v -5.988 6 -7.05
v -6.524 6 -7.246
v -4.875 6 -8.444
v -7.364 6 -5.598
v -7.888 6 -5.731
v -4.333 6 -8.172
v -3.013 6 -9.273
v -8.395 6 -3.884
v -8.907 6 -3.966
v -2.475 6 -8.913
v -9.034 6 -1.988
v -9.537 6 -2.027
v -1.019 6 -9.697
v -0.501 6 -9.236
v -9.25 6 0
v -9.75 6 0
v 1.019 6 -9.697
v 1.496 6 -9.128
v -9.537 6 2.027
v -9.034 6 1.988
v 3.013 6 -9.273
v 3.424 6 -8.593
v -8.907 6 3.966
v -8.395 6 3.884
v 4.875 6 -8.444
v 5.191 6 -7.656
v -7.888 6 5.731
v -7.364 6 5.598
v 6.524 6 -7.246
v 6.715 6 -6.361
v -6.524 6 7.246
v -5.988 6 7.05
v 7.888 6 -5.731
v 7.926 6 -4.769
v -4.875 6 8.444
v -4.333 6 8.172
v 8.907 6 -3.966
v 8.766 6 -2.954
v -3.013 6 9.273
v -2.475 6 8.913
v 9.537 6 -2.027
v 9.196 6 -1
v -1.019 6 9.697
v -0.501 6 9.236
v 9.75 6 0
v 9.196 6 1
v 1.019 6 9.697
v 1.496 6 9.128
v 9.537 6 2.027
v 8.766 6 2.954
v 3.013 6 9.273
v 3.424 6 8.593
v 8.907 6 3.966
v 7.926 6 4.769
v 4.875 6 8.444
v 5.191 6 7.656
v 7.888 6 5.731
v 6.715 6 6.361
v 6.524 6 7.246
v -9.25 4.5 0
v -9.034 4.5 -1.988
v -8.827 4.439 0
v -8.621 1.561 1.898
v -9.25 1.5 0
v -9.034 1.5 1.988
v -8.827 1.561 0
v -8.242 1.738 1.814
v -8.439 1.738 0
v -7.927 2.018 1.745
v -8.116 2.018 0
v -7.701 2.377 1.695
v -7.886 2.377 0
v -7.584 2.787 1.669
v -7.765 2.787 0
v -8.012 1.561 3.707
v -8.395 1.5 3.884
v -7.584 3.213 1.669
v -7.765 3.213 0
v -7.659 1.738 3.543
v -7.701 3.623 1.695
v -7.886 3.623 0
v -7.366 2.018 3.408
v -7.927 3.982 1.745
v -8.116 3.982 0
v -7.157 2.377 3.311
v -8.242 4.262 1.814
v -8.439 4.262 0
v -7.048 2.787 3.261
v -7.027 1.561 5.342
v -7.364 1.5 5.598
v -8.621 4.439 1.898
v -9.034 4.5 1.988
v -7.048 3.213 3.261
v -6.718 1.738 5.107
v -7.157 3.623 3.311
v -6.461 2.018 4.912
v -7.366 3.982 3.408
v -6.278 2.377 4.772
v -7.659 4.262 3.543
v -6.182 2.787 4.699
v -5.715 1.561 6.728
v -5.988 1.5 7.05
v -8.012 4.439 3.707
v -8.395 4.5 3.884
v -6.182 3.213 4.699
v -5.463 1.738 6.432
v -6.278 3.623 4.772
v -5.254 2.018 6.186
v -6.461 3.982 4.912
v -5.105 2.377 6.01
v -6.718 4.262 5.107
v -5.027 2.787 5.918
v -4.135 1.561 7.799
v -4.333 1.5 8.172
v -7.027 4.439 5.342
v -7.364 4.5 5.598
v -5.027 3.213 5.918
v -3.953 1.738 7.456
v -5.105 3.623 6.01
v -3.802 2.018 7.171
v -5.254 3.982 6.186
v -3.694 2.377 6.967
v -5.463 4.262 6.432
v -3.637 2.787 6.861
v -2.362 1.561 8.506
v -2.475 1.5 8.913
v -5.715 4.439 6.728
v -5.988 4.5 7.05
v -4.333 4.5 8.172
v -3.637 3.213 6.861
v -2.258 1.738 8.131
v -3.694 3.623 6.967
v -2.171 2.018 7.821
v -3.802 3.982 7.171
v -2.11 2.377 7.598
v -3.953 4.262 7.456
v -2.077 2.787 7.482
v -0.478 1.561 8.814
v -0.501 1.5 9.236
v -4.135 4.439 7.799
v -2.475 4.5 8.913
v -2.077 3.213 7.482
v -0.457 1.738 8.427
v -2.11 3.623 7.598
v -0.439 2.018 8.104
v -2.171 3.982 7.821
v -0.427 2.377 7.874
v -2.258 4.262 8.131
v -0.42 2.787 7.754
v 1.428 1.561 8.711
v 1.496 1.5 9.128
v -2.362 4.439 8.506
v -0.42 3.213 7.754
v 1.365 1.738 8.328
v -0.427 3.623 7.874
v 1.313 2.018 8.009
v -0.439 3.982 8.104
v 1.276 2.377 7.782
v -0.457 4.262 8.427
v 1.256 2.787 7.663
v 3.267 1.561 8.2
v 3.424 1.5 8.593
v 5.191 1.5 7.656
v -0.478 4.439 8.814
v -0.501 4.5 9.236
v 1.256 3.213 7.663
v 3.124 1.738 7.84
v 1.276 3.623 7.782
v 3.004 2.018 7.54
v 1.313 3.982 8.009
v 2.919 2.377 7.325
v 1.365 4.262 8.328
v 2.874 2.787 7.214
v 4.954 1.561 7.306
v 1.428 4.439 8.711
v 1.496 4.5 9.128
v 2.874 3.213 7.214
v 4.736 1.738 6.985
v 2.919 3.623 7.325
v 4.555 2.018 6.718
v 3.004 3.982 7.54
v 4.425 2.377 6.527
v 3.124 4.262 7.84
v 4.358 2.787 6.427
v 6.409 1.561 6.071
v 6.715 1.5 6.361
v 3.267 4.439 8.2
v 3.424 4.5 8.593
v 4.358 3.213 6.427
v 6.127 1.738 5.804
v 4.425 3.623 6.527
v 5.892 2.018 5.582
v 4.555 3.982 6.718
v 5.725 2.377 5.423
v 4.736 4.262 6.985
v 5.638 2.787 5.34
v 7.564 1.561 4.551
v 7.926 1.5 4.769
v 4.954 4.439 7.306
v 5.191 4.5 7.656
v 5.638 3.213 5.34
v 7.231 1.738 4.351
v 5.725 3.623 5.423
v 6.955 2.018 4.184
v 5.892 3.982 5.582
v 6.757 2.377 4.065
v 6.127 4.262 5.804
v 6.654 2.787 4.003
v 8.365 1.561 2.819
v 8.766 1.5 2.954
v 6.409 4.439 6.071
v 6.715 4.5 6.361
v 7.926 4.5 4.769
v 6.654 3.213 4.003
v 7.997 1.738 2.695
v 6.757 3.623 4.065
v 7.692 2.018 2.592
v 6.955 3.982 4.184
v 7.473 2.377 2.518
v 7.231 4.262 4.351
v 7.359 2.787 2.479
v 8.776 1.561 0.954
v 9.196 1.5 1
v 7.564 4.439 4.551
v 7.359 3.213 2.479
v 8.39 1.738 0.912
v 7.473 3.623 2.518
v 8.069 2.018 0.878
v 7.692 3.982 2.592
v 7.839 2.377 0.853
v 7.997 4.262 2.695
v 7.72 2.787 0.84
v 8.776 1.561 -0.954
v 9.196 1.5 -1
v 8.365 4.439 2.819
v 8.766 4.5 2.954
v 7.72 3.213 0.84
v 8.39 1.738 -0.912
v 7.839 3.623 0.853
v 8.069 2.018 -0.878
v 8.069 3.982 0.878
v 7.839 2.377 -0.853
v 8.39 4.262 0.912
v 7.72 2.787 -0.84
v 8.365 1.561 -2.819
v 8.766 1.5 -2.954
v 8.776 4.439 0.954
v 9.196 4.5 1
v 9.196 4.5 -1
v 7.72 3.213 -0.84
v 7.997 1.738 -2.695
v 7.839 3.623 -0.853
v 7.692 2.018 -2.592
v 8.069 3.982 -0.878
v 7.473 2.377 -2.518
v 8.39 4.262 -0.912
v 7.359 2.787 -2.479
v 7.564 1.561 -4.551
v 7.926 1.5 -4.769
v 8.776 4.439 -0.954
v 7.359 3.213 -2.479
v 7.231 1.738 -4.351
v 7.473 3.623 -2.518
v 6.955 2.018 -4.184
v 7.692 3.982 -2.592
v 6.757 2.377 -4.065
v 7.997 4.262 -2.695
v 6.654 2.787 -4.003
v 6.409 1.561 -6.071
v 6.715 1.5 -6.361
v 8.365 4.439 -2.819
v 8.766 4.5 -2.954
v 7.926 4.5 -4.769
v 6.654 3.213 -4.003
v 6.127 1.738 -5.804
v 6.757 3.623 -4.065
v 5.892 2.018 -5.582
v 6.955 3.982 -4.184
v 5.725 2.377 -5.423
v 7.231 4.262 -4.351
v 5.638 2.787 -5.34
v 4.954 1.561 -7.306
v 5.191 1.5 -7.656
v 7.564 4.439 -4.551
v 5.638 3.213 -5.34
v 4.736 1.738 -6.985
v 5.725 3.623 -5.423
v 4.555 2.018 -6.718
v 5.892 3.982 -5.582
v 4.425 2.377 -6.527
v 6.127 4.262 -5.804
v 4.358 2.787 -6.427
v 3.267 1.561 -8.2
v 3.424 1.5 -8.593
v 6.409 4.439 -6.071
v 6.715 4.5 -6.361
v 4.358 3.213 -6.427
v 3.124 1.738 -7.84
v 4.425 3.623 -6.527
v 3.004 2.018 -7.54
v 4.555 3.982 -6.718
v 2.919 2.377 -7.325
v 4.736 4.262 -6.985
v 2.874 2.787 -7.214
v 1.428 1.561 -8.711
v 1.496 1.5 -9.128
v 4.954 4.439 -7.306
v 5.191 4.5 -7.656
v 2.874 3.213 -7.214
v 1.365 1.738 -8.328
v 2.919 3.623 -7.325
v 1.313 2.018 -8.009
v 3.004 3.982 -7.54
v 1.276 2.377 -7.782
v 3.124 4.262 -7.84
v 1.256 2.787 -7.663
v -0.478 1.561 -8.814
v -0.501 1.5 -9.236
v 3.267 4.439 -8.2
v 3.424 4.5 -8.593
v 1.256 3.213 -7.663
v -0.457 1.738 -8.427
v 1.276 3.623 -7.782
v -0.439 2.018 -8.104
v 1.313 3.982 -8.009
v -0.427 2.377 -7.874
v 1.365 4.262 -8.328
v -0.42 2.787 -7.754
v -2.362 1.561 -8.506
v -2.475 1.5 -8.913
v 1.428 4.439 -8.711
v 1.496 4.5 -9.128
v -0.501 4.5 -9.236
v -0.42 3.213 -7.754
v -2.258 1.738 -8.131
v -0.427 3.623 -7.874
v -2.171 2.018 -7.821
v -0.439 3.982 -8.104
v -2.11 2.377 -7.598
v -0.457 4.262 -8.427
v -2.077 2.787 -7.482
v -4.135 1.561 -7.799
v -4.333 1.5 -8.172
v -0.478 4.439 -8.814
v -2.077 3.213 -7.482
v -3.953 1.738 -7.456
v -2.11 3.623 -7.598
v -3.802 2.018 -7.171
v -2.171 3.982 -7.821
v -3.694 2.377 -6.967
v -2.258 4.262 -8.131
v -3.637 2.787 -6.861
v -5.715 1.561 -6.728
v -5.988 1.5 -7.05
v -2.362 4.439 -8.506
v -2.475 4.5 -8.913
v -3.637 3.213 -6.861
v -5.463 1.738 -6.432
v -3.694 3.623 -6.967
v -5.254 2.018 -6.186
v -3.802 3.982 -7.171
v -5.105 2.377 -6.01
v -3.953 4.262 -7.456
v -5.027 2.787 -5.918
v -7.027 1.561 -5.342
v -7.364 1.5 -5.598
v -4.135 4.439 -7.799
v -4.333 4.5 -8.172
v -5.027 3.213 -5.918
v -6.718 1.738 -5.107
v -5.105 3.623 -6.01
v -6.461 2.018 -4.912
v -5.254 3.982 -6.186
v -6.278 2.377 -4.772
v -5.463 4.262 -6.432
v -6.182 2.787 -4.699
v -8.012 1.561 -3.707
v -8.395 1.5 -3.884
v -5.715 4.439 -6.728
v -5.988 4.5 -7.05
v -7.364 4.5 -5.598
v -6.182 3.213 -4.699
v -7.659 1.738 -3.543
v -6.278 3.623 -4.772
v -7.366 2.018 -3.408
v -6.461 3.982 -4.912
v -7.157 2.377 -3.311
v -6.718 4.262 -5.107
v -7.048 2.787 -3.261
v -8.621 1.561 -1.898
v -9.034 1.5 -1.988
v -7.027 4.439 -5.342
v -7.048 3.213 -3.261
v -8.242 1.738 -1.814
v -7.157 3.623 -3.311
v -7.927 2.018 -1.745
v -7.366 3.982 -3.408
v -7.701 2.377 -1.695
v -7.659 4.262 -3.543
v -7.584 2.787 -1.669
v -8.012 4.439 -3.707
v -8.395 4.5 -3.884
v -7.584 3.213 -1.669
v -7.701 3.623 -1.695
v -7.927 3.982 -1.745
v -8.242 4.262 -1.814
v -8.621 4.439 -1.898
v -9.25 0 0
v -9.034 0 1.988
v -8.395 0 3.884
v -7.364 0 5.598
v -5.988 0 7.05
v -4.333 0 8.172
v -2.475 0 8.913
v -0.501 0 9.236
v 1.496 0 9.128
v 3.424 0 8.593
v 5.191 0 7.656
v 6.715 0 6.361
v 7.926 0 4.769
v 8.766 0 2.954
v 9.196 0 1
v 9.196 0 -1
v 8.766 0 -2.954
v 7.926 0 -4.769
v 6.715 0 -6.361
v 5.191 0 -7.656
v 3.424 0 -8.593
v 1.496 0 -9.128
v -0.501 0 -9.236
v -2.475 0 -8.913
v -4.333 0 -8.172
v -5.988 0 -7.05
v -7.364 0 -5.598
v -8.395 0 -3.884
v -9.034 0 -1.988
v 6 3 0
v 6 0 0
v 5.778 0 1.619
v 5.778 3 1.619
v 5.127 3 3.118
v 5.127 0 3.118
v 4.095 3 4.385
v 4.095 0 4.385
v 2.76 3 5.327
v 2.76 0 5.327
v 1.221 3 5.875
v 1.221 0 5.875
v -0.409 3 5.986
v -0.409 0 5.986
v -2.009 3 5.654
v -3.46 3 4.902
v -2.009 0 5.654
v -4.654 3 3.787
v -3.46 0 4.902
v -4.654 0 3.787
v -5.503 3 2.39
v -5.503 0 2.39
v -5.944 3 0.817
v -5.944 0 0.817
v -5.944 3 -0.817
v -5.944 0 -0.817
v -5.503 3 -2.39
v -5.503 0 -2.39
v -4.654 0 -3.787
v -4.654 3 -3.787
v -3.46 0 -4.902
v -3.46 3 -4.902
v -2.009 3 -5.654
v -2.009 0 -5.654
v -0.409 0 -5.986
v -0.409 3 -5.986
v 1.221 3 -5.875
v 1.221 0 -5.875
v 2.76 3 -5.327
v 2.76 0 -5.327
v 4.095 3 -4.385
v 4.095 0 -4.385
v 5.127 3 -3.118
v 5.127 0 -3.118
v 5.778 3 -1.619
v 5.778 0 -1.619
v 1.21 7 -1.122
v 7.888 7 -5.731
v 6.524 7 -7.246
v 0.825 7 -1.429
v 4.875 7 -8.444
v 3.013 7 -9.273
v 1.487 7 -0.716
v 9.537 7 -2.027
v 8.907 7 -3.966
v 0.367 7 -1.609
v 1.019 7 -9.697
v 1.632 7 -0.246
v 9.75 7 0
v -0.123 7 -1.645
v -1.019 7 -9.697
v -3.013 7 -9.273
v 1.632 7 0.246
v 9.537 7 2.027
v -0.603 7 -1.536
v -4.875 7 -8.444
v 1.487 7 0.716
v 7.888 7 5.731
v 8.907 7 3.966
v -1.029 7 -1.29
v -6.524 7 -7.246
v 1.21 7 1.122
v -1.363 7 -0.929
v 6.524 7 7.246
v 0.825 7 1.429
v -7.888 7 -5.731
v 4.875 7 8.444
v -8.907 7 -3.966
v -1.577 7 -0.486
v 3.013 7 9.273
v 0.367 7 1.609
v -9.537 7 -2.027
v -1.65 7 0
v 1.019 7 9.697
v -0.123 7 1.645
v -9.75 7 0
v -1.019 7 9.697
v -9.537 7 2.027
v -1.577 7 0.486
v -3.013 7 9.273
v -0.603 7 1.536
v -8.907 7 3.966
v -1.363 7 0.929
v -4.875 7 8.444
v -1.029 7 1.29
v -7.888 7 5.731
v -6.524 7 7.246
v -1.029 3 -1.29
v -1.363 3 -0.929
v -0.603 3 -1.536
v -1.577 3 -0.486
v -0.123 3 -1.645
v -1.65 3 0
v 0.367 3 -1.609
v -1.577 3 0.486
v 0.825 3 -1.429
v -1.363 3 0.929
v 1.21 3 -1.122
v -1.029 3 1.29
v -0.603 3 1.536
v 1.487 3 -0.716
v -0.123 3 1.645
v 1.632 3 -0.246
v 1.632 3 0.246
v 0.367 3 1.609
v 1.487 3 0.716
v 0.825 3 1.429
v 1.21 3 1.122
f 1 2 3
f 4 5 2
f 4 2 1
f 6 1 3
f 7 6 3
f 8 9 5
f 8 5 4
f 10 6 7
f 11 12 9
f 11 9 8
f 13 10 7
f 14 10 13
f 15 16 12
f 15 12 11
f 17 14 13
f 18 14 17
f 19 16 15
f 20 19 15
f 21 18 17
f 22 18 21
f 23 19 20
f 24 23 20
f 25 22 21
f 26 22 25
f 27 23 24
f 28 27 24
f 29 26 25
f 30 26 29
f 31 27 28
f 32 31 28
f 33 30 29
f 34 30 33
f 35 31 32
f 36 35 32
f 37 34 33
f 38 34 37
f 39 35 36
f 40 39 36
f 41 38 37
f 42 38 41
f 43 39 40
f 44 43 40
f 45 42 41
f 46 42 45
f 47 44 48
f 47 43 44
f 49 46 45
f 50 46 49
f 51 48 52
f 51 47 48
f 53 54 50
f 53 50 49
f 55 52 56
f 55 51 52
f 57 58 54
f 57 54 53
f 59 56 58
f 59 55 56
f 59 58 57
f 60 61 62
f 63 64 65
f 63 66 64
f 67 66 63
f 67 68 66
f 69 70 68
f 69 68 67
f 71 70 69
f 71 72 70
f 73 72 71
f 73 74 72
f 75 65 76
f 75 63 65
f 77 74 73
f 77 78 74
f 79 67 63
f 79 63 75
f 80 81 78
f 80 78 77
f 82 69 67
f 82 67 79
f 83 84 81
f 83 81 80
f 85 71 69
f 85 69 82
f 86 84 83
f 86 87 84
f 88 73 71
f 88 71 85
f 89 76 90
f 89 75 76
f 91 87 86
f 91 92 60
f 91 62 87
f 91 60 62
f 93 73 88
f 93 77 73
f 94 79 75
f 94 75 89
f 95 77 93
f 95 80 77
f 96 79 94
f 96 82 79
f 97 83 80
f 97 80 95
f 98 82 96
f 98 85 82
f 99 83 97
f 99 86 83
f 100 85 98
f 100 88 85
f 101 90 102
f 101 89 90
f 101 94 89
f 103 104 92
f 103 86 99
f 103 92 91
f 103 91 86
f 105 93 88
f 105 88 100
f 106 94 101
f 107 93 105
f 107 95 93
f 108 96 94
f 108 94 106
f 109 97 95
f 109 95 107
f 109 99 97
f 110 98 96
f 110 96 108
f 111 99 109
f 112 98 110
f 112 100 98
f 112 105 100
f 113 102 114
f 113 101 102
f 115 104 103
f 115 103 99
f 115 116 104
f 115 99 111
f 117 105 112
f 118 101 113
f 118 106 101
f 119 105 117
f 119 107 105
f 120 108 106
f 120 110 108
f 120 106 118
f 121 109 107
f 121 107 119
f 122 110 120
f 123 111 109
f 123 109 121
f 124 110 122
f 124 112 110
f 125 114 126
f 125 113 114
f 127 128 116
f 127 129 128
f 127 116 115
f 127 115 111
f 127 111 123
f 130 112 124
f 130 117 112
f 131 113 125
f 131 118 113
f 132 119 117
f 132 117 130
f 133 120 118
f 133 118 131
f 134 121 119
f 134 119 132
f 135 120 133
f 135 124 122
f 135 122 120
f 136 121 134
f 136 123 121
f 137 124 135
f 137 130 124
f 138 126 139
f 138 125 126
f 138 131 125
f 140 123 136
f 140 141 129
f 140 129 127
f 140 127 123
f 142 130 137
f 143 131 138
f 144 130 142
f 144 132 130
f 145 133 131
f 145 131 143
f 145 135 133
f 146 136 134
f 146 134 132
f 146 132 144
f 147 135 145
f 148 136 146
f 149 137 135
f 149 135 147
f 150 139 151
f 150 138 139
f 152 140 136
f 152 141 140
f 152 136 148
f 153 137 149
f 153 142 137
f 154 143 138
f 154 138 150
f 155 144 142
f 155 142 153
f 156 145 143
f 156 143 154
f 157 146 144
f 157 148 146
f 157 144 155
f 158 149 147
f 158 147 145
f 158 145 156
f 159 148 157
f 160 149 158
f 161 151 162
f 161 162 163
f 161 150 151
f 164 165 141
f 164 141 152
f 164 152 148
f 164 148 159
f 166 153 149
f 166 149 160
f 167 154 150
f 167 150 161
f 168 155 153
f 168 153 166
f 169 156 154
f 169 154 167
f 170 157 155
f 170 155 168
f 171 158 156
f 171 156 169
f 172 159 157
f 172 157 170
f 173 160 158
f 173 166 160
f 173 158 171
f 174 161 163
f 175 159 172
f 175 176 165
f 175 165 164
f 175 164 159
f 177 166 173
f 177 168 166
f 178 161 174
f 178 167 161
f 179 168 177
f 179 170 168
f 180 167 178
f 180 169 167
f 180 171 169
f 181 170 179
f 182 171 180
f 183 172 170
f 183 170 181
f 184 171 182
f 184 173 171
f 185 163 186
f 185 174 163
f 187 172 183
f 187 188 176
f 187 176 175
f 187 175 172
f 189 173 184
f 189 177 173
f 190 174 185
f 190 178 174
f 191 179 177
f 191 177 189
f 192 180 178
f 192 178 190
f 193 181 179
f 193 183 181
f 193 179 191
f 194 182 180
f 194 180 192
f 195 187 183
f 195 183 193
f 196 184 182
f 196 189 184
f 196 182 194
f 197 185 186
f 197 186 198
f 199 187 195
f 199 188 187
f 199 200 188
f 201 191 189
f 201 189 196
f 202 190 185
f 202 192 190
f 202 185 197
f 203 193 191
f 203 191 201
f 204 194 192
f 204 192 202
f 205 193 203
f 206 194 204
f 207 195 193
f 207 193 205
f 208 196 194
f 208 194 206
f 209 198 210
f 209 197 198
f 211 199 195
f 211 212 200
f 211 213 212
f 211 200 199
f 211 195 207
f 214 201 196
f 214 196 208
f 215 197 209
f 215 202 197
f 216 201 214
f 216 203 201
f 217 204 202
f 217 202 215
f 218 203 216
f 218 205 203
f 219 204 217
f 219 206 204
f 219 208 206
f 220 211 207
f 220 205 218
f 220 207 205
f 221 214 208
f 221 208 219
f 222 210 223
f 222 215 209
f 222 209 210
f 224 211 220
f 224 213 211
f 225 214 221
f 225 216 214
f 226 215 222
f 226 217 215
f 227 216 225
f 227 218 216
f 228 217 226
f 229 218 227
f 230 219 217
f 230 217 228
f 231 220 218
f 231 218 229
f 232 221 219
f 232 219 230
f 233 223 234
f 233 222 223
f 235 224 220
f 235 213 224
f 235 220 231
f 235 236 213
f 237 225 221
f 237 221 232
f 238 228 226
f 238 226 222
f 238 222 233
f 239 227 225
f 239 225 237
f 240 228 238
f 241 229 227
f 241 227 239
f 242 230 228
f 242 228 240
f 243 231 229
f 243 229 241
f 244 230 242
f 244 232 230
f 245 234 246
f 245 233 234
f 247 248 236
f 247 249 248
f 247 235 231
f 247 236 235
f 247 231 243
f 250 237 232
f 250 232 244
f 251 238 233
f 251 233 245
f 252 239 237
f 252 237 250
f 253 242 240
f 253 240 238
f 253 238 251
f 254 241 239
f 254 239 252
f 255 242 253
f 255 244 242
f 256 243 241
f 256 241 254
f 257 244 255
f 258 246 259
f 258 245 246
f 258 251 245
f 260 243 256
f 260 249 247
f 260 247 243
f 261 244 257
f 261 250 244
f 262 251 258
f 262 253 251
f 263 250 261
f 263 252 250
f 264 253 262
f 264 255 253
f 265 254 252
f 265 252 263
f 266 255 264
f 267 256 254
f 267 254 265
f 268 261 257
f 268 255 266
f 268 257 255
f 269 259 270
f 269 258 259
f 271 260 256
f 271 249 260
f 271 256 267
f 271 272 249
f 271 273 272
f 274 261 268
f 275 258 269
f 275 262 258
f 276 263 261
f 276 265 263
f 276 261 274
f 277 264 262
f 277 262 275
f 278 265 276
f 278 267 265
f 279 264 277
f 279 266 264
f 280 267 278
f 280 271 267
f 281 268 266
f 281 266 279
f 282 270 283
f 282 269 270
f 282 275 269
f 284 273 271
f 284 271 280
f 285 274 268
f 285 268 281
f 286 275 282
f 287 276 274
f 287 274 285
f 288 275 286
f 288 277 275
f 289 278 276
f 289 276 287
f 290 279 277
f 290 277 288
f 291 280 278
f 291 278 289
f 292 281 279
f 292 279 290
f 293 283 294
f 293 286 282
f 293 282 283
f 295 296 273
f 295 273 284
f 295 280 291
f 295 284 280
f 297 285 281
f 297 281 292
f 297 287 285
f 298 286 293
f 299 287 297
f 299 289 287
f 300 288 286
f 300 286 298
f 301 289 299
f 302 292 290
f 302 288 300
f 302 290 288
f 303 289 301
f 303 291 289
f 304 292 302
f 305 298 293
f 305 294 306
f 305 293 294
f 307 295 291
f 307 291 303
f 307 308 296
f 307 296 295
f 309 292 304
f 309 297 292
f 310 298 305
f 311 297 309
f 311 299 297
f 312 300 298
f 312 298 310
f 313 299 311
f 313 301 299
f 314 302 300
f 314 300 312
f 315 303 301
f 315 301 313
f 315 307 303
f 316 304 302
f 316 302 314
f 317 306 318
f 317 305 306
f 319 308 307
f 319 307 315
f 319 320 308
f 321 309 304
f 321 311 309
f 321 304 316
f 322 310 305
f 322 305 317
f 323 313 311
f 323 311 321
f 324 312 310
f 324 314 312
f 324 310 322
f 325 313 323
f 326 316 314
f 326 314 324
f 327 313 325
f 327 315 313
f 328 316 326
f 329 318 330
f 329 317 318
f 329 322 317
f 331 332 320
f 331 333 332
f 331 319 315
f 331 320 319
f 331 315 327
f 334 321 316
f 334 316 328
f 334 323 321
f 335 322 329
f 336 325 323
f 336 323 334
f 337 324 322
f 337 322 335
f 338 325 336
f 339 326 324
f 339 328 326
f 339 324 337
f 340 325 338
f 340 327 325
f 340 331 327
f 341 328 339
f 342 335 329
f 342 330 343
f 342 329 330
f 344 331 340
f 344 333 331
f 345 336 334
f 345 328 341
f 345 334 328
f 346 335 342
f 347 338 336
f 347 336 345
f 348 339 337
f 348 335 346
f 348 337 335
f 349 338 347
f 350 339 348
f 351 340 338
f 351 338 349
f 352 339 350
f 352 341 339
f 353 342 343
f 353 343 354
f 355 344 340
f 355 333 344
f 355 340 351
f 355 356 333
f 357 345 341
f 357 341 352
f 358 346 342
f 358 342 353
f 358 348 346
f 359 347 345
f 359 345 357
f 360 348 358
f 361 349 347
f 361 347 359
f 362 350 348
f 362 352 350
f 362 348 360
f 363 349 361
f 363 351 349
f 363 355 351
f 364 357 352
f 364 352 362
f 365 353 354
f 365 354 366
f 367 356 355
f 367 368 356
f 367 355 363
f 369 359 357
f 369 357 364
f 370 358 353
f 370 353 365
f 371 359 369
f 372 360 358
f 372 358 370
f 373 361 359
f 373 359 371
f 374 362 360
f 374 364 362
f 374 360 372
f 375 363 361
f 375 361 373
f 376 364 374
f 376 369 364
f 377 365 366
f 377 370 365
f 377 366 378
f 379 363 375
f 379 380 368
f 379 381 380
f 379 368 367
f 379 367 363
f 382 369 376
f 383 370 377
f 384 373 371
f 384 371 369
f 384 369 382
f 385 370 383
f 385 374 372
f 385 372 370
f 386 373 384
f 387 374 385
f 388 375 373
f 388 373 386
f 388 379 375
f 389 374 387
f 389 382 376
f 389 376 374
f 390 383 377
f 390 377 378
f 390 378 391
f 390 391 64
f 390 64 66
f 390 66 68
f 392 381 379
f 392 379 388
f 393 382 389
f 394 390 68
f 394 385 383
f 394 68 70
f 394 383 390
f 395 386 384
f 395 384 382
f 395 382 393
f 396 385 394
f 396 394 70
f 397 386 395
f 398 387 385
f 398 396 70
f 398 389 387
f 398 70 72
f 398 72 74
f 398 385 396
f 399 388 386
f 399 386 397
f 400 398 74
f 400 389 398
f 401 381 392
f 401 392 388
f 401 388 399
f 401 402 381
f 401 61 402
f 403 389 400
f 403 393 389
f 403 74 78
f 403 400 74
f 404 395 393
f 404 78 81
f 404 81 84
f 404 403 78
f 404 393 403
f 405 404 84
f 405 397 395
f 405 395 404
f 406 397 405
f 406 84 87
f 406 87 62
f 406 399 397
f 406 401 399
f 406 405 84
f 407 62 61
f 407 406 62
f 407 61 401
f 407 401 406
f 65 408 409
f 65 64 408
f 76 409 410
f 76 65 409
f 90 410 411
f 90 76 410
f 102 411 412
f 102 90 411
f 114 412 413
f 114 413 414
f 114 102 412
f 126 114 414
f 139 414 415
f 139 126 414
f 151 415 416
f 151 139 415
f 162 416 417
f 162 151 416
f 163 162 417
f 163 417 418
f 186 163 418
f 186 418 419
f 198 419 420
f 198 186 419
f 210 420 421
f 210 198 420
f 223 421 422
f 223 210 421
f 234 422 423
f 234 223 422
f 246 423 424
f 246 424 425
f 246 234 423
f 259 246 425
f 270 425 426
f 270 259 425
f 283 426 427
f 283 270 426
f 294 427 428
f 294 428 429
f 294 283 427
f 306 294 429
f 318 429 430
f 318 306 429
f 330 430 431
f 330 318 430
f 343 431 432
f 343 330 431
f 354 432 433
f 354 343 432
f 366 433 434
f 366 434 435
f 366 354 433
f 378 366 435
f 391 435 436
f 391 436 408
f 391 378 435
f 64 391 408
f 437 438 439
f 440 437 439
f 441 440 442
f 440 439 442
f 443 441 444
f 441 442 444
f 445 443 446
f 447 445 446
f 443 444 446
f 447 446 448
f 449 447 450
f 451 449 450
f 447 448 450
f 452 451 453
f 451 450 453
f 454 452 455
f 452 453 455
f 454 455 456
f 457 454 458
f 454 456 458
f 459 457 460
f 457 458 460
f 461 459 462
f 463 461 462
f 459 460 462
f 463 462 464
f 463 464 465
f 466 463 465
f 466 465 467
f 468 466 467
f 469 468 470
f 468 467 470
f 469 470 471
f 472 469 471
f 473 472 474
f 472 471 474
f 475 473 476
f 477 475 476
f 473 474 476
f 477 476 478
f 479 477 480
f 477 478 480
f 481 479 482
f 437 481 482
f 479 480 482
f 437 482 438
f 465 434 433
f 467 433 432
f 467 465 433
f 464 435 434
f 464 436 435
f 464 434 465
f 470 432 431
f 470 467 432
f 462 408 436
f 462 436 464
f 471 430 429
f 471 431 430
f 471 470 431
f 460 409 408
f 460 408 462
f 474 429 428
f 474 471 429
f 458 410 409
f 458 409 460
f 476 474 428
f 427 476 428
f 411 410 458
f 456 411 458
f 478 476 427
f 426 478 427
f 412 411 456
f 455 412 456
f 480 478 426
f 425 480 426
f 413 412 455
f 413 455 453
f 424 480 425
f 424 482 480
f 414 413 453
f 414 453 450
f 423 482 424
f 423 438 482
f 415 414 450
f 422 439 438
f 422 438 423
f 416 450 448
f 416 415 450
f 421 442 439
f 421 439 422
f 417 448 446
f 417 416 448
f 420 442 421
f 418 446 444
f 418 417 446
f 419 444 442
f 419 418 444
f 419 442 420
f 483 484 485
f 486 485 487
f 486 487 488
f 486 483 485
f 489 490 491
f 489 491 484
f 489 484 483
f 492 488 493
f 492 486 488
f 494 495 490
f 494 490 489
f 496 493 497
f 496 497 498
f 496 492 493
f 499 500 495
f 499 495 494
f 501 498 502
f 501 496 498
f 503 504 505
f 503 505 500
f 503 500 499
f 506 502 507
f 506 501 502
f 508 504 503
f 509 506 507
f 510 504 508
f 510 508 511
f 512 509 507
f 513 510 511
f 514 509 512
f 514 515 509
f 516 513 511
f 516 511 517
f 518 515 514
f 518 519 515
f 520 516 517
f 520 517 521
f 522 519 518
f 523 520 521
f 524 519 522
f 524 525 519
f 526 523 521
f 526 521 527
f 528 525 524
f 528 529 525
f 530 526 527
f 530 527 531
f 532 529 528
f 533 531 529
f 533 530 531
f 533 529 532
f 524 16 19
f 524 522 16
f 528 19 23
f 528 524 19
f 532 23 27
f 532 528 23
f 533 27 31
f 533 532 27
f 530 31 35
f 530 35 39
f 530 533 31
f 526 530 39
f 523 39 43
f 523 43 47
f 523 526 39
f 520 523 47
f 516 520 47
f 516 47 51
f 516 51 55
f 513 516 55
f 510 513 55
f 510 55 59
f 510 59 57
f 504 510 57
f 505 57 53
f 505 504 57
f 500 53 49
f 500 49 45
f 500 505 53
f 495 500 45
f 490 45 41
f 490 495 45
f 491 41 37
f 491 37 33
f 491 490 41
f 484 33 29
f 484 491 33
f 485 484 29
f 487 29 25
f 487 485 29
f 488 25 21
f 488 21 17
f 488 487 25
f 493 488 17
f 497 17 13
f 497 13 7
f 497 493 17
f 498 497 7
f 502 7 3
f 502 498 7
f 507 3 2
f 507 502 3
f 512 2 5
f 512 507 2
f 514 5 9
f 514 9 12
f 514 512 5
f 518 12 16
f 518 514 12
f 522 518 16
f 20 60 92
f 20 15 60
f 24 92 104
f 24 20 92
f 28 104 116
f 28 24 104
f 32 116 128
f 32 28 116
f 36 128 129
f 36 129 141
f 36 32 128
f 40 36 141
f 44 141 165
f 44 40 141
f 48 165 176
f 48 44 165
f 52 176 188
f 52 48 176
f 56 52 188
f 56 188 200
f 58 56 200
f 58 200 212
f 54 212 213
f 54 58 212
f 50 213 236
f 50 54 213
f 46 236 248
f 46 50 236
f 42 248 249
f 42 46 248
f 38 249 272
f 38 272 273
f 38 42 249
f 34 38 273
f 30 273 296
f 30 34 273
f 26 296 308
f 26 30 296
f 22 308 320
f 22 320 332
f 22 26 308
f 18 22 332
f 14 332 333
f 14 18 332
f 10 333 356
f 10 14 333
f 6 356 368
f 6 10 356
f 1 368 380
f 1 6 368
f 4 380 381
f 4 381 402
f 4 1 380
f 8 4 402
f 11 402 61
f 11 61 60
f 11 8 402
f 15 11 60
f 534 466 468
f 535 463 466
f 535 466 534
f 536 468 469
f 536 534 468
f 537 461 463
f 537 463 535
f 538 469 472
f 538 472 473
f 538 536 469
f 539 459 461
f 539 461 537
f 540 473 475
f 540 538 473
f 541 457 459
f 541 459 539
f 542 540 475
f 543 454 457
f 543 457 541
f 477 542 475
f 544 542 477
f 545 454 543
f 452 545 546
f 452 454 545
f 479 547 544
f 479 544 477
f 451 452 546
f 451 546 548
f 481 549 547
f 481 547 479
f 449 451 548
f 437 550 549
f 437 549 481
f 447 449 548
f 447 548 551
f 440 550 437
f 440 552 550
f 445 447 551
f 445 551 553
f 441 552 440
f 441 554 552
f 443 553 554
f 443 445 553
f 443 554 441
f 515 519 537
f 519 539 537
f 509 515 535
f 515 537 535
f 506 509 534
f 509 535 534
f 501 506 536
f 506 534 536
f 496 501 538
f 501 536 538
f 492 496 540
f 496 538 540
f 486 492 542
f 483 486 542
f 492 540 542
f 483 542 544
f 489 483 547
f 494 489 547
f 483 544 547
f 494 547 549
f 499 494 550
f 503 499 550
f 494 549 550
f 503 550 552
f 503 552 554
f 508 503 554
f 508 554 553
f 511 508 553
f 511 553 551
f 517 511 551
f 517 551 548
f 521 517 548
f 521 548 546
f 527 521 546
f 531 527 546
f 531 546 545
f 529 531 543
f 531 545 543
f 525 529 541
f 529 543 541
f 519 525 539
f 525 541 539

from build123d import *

# Parameters (mm, degrees)
SKETCH4_R                 = 6
CUT_EXTRUDE1_DEPTH        = 3
M4X0_7_TAPPED_HOLE1_D     = 3.3
M4X0_7_TAPPED_HOLE1_DEPTH = 4
M4X0_7_TAPPED_HOLE1_TIP   = 0.991420021


with BuildPart() as part:
    # Sketch1 → Revolve1 (revolve)
    with BuildSketch(Plane.XY):
        with BuildLine():
            Line((0, 0), (-9.25, 0))
            Line((-9.25, 0), (-9.25, 1.5))
            ThreePointArc((-9.25, 1.5), (-7.75, 3), (-9.25, 4.5))
            Line((-9.25, 4.5), (-9.25, 6))
            Line((-9.25, 6), (-9.75, 6))
            Line((-9.75, 6), (-9.75, 7))
            Line((-9.75, 7), (0, 7))
            Line((0, 7), (0, 0))
        make_face()
    revolve(axis=Axis((0, 0, 0), (0, 1, 0)))

    # Sketch4 → Cut-Extrude1 (cut)
    with BuildSketch(Plane.XZ):
        Circle(SKETCH4_R)
    extrude(amount=-CUT_EXTRUDE1_DEPTH, mode=Mode.SUBTRACT)

    # M4x0.7 Tapped Hole1
    with Locations(Plane(origin=(0, 7, 0), x_dir=(1, 0, 0), z_dir=(0, 1, 0))):
        with Locations((0, 0)):
            Hole(M4X0_7_TAPPED_HOLE1_D / 2, depth=M4X0_7_TAPPED_HOLE1_DEPTH)
            with Locations((0, 0, -(M4X0_7_TAPPED_HOLE1_DEPTH + M4X0_7_TAPPED_HOLE1_TIP / 2))):  # 118° drill point
                Cone(0, M4X0_7_TAPPED_HOLE1_D / 2, M4X0_7_TAPPED_HOLE1_TIP, mode=Mode.SUBTRACT)


solid = part.part
